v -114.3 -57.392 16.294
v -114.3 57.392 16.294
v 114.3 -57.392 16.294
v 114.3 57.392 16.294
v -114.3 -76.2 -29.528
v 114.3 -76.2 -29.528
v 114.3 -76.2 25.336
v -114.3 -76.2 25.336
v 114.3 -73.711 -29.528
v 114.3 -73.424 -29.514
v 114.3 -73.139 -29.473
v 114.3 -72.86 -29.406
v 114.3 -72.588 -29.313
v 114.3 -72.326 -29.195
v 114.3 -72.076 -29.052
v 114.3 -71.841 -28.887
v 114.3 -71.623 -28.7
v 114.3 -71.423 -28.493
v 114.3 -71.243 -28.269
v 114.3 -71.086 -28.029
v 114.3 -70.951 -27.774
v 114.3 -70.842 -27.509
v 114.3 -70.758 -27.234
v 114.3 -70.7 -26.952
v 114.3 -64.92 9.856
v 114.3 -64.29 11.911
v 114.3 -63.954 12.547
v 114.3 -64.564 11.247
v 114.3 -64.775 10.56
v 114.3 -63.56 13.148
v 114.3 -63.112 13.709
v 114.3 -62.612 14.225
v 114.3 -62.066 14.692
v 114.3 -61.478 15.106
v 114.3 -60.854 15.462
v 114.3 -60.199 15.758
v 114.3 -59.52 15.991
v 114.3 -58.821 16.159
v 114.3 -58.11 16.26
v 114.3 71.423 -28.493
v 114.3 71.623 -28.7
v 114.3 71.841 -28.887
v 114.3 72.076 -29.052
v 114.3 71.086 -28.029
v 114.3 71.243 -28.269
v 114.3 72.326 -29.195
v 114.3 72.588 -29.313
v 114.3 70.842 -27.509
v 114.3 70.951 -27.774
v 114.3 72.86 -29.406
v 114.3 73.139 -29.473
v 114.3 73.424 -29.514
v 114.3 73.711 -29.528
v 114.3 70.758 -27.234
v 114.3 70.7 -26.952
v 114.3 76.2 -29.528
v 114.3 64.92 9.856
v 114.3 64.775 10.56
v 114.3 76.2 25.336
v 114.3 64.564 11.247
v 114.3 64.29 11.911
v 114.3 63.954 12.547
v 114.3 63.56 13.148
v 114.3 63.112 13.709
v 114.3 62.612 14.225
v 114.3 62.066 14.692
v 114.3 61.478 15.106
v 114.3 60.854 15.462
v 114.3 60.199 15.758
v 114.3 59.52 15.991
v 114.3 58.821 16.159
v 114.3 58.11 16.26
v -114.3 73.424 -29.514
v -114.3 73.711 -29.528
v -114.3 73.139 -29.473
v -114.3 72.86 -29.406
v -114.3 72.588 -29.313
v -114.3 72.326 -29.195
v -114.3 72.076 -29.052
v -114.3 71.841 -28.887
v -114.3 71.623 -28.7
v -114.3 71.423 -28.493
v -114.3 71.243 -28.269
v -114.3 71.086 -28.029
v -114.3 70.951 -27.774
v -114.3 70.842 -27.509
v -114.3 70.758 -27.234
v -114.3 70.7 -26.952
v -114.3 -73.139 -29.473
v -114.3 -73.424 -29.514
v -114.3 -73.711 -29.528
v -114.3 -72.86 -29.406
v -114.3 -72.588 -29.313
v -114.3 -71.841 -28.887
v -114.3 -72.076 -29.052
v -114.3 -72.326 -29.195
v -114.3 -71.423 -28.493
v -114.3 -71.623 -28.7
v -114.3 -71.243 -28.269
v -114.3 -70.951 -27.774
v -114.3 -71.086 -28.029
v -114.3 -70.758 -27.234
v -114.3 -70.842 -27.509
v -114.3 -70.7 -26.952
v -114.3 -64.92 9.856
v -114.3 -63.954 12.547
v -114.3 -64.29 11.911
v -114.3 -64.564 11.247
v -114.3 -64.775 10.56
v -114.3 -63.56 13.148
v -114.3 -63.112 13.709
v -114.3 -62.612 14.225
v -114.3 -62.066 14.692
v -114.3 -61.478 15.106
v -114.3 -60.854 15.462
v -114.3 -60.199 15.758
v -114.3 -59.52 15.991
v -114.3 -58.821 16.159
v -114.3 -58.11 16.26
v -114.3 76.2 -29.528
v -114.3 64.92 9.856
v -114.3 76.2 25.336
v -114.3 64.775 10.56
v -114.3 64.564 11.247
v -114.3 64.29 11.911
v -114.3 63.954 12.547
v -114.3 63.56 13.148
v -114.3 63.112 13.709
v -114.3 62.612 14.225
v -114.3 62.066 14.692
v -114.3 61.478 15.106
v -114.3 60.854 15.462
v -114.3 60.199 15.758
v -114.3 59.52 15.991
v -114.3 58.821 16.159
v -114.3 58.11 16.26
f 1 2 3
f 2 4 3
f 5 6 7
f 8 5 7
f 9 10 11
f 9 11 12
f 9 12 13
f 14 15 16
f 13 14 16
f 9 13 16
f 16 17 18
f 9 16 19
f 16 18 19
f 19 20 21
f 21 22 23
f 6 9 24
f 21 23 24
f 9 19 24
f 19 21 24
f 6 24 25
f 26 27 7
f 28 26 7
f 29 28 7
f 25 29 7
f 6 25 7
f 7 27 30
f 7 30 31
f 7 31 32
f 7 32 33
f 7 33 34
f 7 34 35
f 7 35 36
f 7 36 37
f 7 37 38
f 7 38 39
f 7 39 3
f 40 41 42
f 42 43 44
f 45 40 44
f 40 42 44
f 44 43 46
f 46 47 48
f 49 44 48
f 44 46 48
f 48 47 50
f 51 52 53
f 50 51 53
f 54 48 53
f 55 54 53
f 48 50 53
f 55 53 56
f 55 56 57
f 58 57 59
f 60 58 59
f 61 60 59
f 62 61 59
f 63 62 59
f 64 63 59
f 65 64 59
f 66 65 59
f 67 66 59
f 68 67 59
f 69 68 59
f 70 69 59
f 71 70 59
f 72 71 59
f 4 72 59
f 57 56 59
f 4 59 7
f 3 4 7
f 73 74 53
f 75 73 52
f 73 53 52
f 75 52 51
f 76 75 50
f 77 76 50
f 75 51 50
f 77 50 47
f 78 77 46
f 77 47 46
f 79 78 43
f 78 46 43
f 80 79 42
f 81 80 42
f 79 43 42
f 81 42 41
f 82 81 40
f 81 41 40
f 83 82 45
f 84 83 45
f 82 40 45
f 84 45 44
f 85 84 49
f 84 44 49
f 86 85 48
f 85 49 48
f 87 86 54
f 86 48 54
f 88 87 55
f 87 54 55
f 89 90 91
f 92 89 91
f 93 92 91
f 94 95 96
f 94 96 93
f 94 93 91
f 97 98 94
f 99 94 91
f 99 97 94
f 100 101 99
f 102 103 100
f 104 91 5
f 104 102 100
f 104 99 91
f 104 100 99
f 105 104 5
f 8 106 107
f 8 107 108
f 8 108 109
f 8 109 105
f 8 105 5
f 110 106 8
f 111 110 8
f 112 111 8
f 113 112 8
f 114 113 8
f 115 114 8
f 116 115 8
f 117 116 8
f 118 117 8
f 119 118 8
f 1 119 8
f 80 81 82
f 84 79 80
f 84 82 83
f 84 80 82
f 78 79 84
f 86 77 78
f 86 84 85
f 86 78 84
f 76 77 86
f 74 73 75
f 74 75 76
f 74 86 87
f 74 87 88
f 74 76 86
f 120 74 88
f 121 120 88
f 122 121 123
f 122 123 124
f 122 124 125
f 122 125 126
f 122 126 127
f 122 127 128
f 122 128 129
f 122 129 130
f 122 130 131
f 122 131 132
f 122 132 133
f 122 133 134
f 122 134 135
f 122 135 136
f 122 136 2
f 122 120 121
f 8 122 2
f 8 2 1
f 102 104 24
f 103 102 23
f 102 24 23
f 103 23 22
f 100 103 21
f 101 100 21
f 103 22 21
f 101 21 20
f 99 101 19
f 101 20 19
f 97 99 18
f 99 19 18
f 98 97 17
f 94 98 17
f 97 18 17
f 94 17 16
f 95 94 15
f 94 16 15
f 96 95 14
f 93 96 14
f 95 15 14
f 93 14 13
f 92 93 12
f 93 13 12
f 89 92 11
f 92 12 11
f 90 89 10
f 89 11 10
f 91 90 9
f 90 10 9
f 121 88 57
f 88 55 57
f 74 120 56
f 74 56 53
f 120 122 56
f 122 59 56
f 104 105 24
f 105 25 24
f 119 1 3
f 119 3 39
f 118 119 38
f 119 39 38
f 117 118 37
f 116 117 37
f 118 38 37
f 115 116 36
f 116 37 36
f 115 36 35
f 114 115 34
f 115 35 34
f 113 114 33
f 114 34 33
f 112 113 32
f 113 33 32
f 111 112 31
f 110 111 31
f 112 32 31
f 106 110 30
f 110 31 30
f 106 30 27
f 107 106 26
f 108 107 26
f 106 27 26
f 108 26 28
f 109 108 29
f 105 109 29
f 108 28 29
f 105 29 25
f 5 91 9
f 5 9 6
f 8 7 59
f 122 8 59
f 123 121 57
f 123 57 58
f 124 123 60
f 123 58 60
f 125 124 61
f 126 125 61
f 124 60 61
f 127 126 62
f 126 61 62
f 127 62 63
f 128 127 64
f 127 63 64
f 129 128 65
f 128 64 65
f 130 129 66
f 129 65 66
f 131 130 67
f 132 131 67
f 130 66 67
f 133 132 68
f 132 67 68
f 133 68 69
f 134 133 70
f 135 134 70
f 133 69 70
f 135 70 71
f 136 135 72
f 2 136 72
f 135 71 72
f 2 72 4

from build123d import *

# Parameters (mm, degrees)
BOSS_EXTRUDE1_DEPTH = 114.3


with BuildPart() as part:
    # Sketch1 → Boss-Extrude1 (new body, symmetric)
    with BuildSketch(Plane(origin=(0, 0, 0), x_dir=(0, 0, -1), z_dir=(1, 0, 0))):
        with BuildLine():
            Line((-25.3365, -76.2), (-25.3365, 76.2))
            Line((-25.3365, 76.2), (29.5275, 76.2))
            Line((29.5275, 76.2), (29.5275, 73.710744653))
            ThreePointArc((29.5275, 73.710744653), (28.795909131, 71.72969626), (26.952334163, 70.699643218))
            Line((26.952334163, 70.699643218), (-9.856185406, 64.919590337))
            ThreePointArc((-9.856185406, 64.919590337), (-14.465122828, 62.344457732), (-16.2941, 57.391836749))
            Line((-16.2941, 57.391836749), (-16.2941, -57.391836749))
            ThreePointArc((-16.2941, -57.391836749), (-14.465122828, -62.344457732), (-9.856185406, -64.919590337))
            Line((-9.856185406, -64.919590337), (26.952334163, -70.699643218))
            ThreePointArc((26.952334163, -70.699643218), (28.795909131, -71.72969626), (29.5275, -73.710744653))
            Line((29.5275, -73.710744653), (29.5275, -76.2))
            Line((29.5275, -76.2), (-25.3365, -76.2))
        make_face()
    extrude(amount=BOSS_EXTRUDE1_DEPTH, both=True)


solid = part.part
